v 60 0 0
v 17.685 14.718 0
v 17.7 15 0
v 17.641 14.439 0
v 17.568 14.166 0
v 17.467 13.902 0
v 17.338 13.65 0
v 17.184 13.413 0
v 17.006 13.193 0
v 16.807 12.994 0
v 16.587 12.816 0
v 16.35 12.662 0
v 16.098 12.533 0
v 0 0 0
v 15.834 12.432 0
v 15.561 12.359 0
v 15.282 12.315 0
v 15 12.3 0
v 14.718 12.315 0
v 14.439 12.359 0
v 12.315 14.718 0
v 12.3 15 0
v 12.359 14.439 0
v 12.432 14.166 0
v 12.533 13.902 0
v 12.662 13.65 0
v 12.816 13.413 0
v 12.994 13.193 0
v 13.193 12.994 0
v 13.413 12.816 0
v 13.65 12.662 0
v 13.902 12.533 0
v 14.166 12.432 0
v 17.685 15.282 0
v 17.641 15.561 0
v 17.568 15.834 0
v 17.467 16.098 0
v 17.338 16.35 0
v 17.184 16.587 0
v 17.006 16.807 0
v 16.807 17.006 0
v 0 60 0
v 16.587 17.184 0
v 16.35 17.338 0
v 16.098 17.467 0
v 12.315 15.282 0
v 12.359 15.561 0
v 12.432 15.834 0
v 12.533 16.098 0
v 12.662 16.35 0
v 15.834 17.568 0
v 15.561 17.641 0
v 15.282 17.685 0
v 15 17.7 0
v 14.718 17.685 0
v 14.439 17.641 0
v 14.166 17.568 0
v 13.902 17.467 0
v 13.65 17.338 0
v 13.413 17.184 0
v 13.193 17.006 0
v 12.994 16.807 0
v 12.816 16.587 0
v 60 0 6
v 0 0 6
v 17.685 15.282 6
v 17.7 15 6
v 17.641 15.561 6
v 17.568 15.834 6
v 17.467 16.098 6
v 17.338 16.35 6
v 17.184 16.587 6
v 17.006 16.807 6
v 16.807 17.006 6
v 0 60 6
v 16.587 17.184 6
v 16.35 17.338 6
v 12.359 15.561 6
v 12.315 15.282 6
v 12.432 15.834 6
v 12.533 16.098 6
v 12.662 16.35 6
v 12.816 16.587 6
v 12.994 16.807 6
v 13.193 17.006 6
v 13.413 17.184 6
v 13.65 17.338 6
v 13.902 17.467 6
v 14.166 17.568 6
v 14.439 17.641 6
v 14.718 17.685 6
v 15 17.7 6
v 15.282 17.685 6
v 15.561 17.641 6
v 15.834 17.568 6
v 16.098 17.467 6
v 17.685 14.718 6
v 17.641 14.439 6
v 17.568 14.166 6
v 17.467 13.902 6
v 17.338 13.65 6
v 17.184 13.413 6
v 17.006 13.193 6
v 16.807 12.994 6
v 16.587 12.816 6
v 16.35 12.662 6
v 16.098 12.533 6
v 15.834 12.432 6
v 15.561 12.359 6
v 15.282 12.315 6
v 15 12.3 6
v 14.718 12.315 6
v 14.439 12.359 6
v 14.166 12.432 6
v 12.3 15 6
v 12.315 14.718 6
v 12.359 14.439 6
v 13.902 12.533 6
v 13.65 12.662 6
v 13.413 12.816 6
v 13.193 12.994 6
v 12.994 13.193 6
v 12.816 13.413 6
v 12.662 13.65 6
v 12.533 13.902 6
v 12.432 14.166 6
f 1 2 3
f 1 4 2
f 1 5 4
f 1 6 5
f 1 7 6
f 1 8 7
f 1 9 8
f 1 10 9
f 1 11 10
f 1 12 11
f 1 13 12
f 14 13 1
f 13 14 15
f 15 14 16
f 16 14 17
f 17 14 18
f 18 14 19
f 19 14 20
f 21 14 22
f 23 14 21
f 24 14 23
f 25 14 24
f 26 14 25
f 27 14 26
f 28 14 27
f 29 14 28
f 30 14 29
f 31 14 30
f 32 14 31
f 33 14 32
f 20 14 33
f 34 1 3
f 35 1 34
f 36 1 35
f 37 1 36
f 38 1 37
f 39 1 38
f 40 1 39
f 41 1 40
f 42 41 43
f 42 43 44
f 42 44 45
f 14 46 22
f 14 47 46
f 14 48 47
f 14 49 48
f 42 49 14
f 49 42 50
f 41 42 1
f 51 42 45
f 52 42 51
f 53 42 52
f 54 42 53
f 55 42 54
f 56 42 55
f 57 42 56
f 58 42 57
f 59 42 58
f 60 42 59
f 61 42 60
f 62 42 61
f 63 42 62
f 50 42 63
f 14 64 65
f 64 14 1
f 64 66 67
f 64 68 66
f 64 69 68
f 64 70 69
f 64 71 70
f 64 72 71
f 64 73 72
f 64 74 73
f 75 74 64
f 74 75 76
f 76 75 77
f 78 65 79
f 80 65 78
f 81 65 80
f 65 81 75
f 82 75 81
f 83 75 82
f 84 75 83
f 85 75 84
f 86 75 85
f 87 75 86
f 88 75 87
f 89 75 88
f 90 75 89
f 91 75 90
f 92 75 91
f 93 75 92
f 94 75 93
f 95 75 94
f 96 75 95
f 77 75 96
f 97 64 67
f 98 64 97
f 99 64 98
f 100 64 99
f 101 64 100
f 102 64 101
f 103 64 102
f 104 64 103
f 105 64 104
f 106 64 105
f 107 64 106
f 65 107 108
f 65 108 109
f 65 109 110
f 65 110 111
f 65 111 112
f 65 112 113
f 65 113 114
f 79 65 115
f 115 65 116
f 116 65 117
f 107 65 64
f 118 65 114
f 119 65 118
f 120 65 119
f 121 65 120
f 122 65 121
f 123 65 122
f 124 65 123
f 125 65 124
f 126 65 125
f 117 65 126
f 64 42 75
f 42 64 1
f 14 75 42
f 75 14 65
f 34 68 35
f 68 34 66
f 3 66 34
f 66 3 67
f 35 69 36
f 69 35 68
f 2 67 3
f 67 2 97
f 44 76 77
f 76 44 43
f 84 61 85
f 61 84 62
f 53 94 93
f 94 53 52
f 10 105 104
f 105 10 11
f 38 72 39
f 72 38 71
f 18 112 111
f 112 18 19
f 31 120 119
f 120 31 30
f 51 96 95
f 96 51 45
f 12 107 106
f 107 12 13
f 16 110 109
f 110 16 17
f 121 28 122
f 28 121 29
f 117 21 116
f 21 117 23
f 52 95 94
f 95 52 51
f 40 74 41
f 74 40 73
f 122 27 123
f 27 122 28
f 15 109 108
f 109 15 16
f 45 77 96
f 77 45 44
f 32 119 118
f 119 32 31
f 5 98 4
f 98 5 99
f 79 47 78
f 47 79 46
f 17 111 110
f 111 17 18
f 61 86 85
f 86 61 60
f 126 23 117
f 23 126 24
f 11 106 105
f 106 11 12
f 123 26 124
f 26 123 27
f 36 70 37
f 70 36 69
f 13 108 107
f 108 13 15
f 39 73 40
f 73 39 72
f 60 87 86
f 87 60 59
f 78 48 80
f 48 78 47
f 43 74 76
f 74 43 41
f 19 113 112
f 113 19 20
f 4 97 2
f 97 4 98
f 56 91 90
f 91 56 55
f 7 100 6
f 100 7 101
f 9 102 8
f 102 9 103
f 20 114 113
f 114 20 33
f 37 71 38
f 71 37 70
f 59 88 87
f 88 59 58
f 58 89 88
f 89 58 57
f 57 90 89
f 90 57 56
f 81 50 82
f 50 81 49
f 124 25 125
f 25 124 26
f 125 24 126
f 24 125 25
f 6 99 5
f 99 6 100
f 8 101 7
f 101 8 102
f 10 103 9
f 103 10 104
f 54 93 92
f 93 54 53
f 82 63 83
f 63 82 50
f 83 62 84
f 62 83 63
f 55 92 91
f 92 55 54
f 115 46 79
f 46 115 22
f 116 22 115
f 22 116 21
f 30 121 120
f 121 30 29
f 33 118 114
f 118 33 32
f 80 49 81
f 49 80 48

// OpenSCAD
// Triangular reinforcement gusset.
$fn = 60;
eps = 0.02;
leg = 60;
thickness = 6;
difference() {
    linear_extrude(height=thickness) polygon(points=[[0,0],[leg,0],[0,leg]]);
    translate([leg*0.25,leg*0.25,-eps]) cylinder(d=5.4,h=thickness+2*eps);
}
